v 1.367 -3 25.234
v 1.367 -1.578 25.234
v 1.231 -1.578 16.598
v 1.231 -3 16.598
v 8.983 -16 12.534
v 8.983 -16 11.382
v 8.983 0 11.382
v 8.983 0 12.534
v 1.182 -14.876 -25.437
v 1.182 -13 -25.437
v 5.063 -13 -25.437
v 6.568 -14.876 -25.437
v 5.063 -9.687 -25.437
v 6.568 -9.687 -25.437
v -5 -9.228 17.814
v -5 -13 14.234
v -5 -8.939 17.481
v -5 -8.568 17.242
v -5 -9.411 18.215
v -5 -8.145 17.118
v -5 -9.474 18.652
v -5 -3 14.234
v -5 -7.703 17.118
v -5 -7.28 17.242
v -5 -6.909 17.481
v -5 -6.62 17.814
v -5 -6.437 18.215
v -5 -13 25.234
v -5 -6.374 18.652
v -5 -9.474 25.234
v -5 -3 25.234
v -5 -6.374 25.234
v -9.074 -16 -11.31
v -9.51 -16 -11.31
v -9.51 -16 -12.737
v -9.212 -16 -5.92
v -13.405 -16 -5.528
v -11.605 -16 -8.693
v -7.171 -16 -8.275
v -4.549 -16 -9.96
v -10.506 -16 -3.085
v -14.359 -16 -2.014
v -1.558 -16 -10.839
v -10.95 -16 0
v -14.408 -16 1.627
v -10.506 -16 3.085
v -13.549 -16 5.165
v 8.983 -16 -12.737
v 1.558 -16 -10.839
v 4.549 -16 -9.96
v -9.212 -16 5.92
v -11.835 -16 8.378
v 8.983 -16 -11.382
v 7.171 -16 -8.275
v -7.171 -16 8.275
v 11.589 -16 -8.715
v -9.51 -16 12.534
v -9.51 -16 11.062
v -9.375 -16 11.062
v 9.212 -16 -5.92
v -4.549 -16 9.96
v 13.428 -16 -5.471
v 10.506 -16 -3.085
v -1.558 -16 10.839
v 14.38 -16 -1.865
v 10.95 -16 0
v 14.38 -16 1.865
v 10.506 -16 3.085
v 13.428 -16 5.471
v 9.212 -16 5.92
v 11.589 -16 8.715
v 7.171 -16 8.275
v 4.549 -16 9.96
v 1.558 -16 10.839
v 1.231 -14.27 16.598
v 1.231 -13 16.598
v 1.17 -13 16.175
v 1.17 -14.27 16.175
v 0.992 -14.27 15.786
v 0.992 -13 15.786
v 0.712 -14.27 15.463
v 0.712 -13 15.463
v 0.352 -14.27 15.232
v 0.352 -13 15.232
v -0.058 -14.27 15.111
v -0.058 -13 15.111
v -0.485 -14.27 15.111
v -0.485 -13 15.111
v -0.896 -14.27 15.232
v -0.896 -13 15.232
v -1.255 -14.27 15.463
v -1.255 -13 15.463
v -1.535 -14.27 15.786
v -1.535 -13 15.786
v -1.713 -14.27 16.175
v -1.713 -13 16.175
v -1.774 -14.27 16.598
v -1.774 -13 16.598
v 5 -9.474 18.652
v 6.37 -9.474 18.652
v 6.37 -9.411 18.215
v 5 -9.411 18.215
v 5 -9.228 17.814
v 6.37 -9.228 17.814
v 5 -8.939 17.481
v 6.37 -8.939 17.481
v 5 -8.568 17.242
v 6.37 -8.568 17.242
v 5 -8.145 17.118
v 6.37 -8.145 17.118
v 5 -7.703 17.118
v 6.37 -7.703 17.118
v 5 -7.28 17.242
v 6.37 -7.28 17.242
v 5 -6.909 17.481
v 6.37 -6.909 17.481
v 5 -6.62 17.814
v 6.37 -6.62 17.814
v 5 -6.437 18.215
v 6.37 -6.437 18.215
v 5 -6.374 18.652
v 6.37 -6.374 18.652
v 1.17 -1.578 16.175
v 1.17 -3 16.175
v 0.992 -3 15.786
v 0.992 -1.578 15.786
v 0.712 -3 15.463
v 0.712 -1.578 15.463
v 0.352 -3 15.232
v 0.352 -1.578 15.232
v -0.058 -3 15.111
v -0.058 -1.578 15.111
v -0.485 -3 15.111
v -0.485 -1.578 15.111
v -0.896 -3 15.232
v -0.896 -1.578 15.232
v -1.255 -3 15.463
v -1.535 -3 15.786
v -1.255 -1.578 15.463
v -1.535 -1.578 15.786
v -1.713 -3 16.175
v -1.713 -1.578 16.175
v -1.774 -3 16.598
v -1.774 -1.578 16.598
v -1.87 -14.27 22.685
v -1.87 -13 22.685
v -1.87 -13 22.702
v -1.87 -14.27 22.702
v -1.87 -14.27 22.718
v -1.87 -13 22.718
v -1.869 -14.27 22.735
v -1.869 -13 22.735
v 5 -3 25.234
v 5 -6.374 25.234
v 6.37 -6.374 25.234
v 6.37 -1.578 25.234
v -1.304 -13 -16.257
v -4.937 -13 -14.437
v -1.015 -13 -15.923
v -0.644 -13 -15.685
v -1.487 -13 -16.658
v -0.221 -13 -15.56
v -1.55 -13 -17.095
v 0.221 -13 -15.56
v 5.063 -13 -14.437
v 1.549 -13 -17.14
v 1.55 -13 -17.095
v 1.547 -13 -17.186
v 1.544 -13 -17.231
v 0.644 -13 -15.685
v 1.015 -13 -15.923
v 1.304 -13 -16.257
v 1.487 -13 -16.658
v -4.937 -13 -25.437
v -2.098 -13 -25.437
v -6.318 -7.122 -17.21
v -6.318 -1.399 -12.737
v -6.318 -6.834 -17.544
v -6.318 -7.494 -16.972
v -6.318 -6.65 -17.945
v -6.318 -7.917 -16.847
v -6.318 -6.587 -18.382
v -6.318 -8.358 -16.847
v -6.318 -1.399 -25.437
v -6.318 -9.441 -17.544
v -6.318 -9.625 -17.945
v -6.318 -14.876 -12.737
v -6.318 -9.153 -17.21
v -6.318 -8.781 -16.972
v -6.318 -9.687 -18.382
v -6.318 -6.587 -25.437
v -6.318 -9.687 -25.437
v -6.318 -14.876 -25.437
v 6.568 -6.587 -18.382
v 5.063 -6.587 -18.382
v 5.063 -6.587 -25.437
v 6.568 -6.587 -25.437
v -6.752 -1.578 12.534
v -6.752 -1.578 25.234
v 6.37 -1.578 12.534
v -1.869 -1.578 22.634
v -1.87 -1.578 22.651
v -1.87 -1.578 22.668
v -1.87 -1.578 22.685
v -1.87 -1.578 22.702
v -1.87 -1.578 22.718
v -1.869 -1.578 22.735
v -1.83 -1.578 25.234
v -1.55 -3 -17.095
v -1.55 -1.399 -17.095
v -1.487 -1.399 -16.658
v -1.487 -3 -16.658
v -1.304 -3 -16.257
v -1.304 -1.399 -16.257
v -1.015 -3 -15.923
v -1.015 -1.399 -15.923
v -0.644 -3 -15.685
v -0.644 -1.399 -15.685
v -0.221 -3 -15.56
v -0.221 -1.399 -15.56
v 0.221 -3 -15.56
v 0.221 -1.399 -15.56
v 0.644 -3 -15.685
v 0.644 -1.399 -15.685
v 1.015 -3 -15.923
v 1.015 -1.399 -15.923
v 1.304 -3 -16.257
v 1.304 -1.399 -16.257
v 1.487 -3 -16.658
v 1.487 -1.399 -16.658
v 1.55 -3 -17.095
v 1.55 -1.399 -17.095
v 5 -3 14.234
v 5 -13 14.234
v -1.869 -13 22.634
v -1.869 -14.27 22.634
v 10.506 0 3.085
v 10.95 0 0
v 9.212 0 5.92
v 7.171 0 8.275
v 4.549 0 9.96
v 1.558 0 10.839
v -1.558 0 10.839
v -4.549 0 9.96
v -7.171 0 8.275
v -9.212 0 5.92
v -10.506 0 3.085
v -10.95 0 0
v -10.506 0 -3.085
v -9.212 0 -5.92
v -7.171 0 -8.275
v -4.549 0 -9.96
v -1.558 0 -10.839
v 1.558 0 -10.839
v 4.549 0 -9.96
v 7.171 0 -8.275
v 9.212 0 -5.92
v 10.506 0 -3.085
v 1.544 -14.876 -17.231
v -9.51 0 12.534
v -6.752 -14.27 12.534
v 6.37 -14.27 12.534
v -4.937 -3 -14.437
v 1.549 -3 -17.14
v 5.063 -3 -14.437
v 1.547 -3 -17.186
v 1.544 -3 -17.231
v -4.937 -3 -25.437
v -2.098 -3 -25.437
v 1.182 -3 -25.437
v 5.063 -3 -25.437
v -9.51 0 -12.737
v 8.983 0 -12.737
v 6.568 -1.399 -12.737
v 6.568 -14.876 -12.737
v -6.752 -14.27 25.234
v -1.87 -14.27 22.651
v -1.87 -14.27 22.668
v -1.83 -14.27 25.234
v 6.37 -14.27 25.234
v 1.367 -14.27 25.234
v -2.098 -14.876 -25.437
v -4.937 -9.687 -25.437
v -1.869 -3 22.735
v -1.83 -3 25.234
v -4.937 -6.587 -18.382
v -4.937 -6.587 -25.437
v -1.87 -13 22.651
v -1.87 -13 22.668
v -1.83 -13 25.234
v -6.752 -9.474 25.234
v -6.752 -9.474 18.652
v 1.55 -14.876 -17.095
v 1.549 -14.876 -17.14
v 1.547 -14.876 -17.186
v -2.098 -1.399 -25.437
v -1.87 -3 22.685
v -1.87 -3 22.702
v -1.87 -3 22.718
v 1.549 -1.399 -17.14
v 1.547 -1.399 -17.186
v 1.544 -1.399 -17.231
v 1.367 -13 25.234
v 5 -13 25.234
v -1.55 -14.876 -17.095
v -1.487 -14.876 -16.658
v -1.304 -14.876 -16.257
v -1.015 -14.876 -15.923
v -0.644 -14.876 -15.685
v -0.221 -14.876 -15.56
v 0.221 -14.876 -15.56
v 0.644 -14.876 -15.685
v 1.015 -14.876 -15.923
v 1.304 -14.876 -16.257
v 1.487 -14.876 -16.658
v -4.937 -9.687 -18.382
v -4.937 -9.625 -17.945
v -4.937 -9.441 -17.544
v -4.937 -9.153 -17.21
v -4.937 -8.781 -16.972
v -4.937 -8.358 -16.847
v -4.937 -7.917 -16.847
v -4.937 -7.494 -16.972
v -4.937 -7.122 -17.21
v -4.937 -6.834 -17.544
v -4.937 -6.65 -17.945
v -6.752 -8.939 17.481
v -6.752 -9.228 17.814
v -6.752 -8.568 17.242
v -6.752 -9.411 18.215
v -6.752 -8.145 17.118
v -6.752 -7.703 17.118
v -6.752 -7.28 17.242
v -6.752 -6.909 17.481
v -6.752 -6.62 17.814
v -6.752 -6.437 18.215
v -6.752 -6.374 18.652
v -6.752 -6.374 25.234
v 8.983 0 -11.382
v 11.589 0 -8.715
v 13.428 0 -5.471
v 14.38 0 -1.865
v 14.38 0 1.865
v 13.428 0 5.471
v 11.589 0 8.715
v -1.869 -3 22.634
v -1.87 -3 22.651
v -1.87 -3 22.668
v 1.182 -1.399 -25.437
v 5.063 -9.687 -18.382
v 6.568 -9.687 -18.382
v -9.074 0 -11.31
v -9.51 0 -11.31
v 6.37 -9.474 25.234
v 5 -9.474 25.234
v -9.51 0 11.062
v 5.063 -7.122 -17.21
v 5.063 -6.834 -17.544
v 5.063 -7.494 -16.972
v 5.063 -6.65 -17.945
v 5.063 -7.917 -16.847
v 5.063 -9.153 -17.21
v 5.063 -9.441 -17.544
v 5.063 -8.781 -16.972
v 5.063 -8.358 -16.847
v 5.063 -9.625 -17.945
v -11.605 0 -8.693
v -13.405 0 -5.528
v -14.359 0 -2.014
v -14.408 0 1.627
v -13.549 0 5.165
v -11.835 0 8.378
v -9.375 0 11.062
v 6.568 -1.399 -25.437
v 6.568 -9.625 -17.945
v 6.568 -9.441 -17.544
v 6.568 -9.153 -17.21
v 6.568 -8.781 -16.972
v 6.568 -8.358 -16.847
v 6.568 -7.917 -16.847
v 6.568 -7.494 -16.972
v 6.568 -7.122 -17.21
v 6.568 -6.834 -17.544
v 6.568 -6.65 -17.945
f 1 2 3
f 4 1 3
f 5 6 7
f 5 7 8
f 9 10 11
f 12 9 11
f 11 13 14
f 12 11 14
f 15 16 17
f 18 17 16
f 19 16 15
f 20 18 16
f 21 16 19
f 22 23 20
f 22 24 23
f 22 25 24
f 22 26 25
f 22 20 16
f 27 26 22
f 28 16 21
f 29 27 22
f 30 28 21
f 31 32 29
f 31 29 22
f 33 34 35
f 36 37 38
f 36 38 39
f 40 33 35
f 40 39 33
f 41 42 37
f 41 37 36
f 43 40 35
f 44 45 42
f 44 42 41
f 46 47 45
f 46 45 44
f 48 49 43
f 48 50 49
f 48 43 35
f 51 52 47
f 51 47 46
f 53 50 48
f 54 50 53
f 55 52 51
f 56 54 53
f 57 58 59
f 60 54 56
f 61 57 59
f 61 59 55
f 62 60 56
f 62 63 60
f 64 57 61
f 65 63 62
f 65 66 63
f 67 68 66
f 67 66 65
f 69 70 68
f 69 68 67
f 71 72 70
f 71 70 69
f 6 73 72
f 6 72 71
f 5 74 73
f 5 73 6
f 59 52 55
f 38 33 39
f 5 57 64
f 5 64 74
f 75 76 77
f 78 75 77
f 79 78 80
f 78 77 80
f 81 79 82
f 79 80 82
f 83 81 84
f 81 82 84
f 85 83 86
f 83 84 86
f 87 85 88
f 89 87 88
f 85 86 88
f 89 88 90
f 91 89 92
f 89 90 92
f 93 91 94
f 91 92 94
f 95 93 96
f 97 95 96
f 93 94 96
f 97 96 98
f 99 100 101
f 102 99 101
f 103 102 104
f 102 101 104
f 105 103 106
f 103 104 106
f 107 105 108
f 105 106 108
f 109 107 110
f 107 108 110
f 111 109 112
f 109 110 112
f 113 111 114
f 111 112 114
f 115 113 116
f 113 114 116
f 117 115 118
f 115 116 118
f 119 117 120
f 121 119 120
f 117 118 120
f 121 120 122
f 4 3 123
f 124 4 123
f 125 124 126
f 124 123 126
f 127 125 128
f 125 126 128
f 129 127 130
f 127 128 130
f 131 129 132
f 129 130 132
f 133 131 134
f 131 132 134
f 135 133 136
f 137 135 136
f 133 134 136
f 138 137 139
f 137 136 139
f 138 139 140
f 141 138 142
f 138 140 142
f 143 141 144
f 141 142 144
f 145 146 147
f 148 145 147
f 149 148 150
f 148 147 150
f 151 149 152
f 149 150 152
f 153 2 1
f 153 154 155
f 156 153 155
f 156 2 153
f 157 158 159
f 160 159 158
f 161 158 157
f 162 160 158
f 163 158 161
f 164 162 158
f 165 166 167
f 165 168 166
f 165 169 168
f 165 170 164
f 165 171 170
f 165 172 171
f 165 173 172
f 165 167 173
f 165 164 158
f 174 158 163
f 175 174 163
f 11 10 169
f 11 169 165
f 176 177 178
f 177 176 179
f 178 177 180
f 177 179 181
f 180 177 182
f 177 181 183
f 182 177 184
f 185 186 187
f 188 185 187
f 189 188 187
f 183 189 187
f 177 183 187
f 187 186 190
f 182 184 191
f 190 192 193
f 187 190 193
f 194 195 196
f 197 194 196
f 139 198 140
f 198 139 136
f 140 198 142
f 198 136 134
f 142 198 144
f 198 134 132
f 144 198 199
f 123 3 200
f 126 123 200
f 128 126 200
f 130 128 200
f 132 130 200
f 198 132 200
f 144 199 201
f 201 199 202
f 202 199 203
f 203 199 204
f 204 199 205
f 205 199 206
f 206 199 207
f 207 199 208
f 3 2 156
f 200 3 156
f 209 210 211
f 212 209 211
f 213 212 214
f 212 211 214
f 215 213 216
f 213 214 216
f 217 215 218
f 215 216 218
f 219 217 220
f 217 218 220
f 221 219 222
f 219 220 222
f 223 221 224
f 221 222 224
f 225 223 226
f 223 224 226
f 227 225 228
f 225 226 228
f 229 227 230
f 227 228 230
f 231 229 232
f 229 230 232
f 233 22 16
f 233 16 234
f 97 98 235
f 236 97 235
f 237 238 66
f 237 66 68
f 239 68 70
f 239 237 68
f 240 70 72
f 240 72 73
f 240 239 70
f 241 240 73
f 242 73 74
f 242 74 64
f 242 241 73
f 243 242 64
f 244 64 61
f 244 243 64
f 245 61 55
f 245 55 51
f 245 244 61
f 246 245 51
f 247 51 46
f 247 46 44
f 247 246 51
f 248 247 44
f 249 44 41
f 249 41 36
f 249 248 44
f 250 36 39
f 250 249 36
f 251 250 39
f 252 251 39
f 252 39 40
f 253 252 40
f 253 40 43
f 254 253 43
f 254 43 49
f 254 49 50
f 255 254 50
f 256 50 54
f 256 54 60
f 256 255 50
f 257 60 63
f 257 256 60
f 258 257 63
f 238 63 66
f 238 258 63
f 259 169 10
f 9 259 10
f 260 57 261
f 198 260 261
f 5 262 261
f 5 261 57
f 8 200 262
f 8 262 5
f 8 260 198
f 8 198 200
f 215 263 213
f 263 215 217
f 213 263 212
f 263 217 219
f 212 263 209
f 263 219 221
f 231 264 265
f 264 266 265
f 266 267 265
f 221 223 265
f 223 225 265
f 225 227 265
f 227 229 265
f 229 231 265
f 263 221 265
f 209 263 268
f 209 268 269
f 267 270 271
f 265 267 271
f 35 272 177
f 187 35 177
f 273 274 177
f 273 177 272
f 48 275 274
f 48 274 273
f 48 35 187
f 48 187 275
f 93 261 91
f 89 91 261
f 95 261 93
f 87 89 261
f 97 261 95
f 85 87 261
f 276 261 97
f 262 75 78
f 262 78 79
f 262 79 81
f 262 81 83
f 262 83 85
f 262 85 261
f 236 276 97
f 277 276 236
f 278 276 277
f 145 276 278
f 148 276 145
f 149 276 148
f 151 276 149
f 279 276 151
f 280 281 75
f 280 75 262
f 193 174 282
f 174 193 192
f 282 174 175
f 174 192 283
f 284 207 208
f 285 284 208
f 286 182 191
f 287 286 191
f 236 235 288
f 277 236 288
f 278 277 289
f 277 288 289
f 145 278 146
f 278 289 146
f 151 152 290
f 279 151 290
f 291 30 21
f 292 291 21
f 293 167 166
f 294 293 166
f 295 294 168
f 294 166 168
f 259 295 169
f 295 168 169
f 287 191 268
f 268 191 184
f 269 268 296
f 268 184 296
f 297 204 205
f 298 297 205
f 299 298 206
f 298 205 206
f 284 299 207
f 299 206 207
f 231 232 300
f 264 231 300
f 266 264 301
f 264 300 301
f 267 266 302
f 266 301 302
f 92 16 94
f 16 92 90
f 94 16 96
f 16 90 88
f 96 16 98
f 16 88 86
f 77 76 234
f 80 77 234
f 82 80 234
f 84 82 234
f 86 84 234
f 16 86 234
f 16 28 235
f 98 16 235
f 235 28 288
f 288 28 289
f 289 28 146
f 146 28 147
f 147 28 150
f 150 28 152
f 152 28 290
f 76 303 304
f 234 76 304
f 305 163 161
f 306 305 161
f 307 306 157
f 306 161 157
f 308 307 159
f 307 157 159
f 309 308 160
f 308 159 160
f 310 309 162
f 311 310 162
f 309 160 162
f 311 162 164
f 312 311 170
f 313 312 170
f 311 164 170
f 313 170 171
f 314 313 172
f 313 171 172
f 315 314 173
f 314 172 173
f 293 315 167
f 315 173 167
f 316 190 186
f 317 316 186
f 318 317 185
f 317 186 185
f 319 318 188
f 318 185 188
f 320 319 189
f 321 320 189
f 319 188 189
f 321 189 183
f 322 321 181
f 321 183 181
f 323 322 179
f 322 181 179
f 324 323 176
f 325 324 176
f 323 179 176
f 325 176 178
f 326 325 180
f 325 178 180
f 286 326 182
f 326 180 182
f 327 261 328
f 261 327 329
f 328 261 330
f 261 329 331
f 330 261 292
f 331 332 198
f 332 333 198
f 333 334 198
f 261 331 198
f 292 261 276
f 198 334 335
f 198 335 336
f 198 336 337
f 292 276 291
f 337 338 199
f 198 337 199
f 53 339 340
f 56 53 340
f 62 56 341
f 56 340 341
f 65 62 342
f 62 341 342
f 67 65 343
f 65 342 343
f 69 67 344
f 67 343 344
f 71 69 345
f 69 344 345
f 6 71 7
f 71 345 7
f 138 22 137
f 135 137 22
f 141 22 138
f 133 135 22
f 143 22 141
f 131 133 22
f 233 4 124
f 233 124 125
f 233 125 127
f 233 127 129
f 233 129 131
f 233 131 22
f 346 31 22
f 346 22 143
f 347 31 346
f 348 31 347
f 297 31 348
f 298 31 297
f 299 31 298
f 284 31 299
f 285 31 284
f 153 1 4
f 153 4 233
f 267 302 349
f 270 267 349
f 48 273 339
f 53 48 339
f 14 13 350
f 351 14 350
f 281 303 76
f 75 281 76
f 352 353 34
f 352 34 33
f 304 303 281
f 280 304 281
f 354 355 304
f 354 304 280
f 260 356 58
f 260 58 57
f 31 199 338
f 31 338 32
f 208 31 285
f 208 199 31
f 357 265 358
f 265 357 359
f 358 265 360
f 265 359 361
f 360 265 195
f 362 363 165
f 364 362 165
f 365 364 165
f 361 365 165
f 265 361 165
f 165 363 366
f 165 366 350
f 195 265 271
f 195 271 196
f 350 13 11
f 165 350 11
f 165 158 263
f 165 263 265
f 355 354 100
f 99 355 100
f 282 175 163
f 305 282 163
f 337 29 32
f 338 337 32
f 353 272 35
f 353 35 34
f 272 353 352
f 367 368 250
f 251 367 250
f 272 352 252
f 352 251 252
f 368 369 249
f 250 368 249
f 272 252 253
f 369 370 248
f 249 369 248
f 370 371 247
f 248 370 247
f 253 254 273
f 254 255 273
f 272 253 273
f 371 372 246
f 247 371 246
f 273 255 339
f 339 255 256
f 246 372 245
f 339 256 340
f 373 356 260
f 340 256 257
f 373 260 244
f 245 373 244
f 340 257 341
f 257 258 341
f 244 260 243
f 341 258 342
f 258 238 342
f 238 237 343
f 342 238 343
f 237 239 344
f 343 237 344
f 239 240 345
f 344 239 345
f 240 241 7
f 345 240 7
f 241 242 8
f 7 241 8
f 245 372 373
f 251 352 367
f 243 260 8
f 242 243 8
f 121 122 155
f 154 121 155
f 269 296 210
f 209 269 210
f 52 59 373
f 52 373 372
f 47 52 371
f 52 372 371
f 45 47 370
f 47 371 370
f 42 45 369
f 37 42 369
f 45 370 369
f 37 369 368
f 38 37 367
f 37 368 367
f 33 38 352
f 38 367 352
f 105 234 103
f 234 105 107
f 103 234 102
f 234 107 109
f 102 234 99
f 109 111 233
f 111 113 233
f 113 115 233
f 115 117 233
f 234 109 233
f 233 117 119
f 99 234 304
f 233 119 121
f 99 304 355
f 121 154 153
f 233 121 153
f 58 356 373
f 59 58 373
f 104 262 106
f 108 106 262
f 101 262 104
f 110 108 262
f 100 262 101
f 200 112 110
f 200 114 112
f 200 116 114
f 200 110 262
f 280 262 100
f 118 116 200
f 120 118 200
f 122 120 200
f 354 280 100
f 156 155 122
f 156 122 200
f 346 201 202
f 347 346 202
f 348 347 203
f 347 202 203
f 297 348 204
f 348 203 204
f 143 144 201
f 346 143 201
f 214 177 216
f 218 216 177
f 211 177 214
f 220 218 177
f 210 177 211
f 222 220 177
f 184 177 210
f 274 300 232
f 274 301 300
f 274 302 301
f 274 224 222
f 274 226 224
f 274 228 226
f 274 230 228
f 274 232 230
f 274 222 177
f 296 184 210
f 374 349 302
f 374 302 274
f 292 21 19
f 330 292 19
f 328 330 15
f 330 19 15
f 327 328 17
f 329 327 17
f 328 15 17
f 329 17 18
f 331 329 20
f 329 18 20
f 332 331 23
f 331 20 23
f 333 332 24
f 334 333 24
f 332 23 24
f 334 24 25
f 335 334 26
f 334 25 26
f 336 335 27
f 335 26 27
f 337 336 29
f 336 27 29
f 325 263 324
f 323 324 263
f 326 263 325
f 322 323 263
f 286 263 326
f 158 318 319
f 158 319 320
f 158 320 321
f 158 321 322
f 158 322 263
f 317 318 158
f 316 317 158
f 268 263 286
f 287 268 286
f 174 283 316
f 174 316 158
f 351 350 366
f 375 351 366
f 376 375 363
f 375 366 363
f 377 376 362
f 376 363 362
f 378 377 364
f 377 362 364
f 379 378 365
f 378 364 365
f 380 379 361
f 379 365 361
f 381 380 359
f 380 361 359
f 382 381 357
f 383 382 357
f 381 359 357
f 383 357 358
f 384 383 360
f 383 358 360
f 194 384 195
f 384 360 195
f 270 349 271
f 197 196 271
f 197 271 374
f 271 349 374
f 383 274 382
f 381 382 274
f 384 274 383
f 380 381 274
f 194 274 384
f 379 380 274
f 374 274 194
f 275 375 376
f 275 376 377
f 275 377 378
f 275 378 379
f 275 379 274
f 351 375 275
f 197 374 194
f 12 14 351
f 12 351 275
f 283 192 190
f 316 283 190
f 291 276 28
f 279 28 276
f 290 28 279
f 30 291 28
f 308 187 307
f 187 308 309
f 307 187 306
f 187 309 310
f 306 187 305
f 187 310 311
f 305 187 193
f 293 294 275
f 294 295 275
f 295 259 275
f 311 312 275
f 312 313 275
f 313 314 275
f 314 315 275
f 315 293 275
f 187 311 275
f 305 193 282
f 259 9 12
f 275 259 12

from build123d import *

# Parameters (mm, degrees)
F0_R      = 14.5
F0_R_2    = 10.95
F1_DEPTH  = 16
F2_W      = 18.492934294
F2_H      = 14.1721479595
F2_H_2    = 14.1267654391
F3_DEPTH  = 16
F4_W      = 10
F4_H      = 10
F5_DEPTH  = 11
F6_W      = 10
F6_H      = 10
F7_DEPTH  = 11
F9_DEPTH  = 25.4
F10_W     = 18.492934294
F10_H     = 16
F10_W_2   = 13.1218810566
F10_H_2   = 12.6919343169
F11_DEPTH = 12.7
F12_W     = 18.492934294
F12_H     = 16
F12_W_2   = 12.8853693604
F12_H_2   = 13.4778445354
F13_DEPTH = 12.7
F15_DEPTH = 25.4
F17_DEPTH = 25.4


with BuildPart() as f1:
    # F0 (on Front) → F1 (new body)
    with BuildSketch(Plane.XZ):
        Circle(F0_R)
        Circle(F0_R_2, mode=Mode.SUBTRACT)
    extrude(amount=F1_DEPTH)

    # F2 (on Front) → F3 (join)
    with BuildSketch(Plane.XZ):
        with Locations((-0.2633747645, 18.1480851024)):
            Rectangle(F2_W, F2_H)
        with Locations((-0.2633747645, -18.3736211107)):
            Rectangle(F2_W, F2_H_2)
    extrude(amount=F3_DEPTH)

    # F4 (on face) → F5 (cut)
    with BuildSketch(Plane.XY.offset(25.2341590822)):
        with Locations((0, -8)):
            Rectangle(F4_W, F4_H)
    extrude(amount=-F5_DEPTH, mode=Mode.SUBTRACT)

    # F6 (on face) → F7 (cut)
    with BuildSketch(Plane(origin=(0, 0, -25.4370038303), x_dir=(1, 0, 0), z_dir=(0, 0, -1))):
        with Locations((0.0633943081, 8)):
            Rectangle(F6_W, F6_H)
    extrude(amount=-F7_DEPTH, mode=Mode.SUBTRACT)

    # F8 (on face) → F9 (cut)
    with BuildSketch(Plane(origin=(0, 0, 0), x_dir=(-1, 0, 0), z_dir=(0, 1, 0))):
        with BuildLine():
            Line((1.8700940227, 22.6846607949), (1.8692923579, 22.6340436))
            ThreePointArc((1.8692923579, 22.6340436), (1.8698935939, 22.6593490235), (1.8700940227, 22.6846607949))
        make_face()
        with BuildLine():
            Line((1.7736972601, 16.5981590822), (1.8692923579, 22.6340436))
            Line((1.8692923579, 22.6340436), (1.8700940227, 22.6846607949))
            Line((1.8700940227, 22.6846607949), (1.8692926448, 22.7352689357))
            Line((1.8692926448, 22.7352689357), (1.8297228193, 25.2341590822))
            Line((1.8297228193, 25.2341590822), (-1.3672542312, 25.2341590822))
            Line((-1.3672542312, 25.2341590822), (-1.2305035169, 16.5981590822))
            ThreePointArc((-1.2305035169, 16.5981590822), (0.2715968716, 15.0960586937), (1.7736972601, 16.5981590822))
        make_face()
        with BuildLine():
            Line((1.8692926448, 22.7352689357), (1.8700940227, 22.6846607949))
            ThreePointArc((1.8700940227, 22.6846607949), (1.8698936656, 22.7099680376), (1.8692926448, 22.7352689357))
        make_face()
        with BuildLine():
            Line((2.097781384, -25.4370038303), (1.55, -17.0946339148))
            ThreePointArc((1.55, -17.0946339148), (0, -15.5446339148), (-1.55, -17.0946339148))
            Line((-1.55, -17.0946339148), (-1.5439814747, -17.2310934543))
            Line((-1.5439814747, -17.2310934543), (-1.1820611591, -25.4370038303))
            Line((-1.1820611591, -25.4370038303), (2.097781384, -25.4370038303))
        make_face()
        with BuildLine():
            Line((-1.5439814747, -17.2310934543), (-1.55, -17.0946339148))
            ThreePointArc((-1.55, -17.0946339148), (-1.5484946377, -17.1629300138), (-1.5439814747, -17.2310934543))
        make_face()
    extrude(amount=-F9_DEPTH, mode=Mode.SUBTRACT)

    # F10 (on face) → F11 (cut)
    with BuildSketch(Plane.XY.offset(25.2341590822)):
        with Locations((-0.2633747645, -8)):
            Rectangle(F10_W, F10_H)
        with Locations((-0.1905632671, -7.9240328416)):
            Rectangle(F10_W_2, F10_H_2, mode=Mode.SUBTRACT)
    extrude(amount=-F11_DEPTH, mode=Mode.SUBTRACT)

    # F12 (on face) → F13 (cut)
    with BuildSketch(Plane(origin=(0, 0, -25.4370038303), x_dir=(1, 0, 0), z_dir=(0, 0, -1))):
        with Locations((-0.2633747645, 8)):
            Rectangle(F12_W, F12_H)
        with Locations((0.125055667, 8.137495548)):
            Rectangle(F12_W_2, F12_H_2, mode=Mode.SUBTRACT)
    extrude(amount=-F13_DEPTH, mode=Mode.SUBTRACT)

    # F14 (on face) → F15 (cut)
    with BuildSketch(Plane.YZ.offset(6.3703772612)):
        with BuildLine():
            Line((-9.4740328416, 25.2341590822), (-9.4740328416, 18.6521150172))
            ThreePointArc((-9.4740328416, 18.6521150172), (-7.9240328416, 17.1021150172), (-6.3740328416, 18.6521150172))
            Line((-6.3740328416, 18.6521150172), (-6.3740328416, 25.2341590822))
            Line((-6.3740328416, 25.2341590822), (-9.4740328416, 25.2341590822))
        make_face()
    extrude(amount=-F15_DEPTH, mode=Mode.SUBTRACT)

    # F16 (on face) → F17 (cut)
    with BuildSketch(Plane(origin=(-6.3176290132, 0, 0), x_dir=(0, -1, 0), z_dir=(-1, 0, 0))):
        with BuildLine():
            Line((9.687495548, -25.4370038303), (9.687495548, -18.3815062046))
            ThreePointArc((9.687495548, -18.3815062046), (8.137495548, -16.8315062046), (6.587495548, -18.3815062046))
            Line((6.587495548, -18.3815062046), (6.587495548, -25.4370038303))
            Line((6.587495548, -25.4370038303), (9.687495548, -25.4370038303))
        make_face()
    extrude(amount=-F17_DEPTH, mode=Mode.SUBTRACT)


solid = f1.part
